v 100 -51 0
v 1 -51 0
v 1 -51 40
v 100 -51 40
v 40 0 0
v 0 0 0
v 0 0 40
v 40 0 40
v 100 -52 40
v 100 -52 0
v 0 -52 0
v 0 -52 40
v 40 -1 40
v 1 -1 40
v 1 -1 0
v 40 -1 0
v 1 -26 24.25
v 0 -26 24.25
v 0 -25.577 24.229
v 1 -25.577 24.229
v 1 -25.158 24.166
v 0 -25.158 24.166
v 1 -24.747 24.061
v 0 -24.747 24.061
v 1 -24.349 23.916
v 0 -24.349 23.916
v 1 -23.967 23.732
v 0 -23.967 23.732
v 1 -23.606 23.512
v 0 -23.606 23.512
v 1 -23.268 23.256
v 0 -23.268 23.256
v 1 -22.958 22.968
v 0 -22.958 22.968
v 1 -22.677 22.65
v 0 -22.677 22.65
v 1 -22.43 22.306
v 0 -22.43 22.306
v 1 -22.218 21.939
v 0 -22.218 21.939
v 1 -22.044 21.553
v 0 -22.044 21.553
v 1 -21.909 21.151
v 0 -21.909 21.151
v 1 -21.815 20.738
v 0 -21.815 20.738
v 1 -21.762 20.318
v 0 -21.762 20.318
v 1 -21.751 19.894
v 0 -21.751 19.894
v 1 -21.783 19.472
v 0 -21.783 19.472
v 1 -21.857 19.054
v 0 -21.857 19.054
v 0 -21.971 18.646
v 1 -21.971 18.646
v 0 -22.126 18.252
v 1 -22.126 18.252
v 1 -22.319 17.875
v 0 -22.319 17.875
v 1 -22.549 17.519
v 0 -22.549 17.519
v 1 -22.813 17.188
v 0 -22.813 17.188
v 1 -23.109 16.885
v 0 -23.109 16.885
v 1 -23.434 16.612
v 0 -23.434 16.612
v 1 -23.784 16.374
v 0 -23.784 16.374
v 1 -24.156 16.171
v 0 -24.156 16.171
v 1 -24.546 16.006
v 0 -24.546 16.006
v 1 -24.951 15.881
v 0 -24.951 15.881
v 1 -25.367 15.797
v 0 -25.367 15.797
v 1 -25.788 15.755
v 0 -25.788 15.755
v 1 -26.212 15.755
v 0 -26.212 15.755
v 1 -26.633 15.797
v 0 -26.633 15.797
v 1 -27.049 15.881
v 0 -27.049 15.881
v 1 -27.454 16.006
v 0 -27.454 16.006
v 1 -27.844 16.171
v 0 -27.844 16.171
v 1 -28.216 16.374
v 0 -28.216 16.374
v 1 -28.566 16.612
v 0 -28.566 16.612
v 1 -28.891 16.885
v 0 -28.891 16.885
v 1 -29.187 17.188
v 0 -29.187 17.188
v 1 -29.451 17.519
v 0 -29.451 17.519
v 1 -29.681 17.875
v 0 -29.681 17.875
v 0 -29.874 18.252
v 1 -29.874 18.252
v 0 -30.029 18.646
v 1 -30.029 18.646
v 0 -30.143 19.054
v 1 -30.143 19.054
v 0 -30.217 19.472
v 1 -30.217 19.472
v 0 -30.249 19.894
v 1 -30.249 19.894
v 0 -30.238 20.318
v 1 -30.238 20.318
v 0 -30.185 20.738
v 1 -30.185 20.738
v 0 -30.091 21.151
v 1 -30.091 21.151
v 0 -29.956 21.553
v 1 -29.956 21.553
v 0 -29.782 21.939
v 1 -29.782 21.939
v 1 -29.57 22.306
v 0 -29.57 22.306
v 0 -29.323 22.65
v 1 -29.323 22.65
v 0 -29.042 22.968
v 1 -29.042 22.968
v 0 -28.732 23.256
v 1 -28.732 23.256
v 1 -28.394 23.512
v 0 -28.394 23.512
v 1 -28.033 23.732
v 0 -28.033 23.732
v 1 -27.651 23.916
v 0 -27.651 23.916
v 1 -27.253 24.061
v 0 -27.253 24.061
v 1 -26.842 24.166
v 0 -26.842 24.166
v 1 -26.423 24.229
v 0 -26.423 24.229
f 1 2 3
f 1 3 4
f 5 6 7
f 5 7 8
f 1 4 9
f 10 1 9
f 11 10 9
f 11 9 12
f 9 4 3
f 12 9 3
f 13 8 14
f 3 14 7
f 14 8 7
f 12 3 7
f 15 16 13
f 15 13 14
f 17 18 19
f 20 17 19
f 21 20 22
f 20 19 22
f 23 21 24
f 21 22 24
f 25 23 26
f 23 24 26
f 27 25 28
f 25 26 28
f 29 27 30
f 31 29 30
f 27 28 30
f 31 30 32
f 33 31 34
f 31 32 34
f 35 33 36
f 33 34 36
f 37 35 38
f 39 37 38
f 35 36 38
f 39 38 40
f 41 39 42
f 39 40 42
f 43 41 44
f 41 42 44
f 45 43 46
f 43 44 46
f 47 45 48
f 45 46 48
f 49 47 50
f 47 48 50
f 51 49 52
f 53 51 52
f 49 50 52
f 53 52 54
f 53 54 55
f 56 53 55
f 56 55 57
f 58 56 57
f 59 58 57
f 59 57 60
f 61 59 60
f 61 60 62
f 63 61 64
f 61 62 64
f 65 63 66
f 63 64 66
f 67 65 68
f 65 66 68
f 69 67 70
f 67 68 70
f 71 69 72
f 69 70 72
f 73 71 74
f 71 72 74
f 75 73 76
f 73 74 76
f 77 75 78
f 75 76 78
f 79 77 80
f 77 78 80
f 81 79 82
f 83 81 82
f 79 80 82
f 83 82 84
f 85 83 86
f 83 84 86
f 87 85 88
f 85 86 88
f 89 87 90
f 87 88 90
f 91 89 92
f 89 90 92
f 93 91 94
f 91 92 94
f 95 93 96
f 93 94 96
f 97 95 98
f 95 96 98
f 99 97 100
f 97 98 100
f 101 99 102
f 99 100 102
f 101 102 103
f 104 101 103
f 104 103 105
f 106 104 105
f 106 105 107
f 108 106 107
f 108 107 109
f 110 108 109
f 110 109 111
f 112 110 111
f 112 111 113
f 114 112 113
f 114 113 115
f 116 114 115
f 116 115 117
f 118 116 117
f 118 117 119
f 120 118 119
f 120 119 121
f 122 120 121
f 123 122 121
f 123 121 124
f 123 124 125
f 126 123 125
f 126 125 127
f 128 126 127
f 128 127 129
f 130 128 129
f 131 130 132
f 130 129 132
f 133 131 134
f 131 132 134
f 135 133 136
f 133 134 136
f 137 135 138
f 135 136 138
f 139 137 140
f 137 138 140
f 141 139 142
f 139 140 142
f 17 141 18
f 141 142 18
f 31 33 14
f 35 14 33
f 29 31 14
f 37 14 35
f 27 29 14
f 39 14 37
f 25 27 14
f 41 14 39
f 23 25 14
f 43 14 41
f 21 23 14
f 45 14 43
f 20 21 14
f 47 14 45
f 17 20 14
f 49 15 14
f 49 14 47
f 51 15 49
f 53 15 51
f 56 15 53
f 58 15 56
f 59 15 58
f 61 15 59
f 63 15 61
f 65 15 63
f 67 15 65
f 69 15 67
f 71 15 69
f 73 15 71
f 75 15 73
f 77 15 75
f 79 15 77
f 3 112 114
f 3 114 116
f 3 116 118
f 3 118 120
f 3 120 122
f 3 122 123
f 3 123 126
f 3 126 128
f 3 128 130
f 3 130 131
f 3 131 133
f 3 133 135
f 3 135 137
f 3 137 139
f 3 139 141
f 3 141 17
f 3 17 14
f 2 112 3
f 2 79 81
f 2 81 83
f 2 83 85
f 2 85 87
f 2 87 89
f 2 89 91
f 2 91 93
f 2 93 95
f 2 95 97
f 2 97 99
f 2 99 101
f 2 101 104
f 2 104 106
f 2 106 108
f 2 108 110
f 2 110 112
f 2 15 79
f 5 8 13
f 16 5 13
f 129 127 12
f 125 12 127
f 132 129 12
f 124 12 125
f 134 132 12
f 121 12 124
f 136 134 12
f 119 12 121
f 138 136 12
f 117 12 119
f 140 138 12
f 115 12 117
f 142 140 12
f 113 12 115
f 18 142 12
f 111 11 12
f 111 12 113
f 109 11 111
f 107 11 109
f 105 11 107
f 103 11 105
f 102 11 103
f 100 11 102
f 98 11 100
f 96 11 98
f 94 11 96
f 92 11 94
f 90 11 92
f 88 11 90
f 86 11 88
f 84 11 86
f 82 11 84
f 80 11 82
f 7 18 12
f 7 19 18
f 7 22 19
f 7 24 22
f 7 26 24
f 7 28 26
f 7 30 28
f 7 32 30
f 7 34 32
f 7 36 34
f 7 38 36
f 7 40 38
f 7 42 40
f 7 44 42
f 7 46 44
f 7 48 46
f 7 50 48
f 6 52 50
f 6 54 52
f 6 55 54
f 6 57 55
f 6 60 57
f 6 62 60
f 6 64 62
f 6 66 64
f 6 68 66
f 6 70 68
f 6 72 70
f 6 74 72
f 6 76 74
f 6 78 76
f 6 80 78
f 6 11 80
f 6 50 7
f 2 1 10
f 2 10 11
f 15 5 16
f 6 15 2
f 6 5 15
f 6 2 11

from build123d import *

# Parameters (mm, degrees)
BOSS_EXTRUDE1_DEPTH = 40
SKETCH2_R           = 4.25
CUT_EXTRUDE1_DEPTH  = 1


with BuildPart() as part:
    # Sketch1 → Boss-Extrude1 (new body)
    with BuildSketch(Plane.XY):
        Polygon((0, 0), (40, 0), (40, -1), (1, -1), (1, -51), (100, -51), (100, -52), (0, -52), align=None)
    extrude(amount=BOSS_EXTRUDE1_DEPTH)

    # Sketch2 → Cut-Extrude1 (cut)
    with BuildSketch(Plane.ZY):
        with Locations((20, -26)):
            Circle(SKETCH2_R)
    extrude(amount=-CUT_EXTRUDE1_DEPTH, mode=Mode.SUBTRACT)


solid = part.part
